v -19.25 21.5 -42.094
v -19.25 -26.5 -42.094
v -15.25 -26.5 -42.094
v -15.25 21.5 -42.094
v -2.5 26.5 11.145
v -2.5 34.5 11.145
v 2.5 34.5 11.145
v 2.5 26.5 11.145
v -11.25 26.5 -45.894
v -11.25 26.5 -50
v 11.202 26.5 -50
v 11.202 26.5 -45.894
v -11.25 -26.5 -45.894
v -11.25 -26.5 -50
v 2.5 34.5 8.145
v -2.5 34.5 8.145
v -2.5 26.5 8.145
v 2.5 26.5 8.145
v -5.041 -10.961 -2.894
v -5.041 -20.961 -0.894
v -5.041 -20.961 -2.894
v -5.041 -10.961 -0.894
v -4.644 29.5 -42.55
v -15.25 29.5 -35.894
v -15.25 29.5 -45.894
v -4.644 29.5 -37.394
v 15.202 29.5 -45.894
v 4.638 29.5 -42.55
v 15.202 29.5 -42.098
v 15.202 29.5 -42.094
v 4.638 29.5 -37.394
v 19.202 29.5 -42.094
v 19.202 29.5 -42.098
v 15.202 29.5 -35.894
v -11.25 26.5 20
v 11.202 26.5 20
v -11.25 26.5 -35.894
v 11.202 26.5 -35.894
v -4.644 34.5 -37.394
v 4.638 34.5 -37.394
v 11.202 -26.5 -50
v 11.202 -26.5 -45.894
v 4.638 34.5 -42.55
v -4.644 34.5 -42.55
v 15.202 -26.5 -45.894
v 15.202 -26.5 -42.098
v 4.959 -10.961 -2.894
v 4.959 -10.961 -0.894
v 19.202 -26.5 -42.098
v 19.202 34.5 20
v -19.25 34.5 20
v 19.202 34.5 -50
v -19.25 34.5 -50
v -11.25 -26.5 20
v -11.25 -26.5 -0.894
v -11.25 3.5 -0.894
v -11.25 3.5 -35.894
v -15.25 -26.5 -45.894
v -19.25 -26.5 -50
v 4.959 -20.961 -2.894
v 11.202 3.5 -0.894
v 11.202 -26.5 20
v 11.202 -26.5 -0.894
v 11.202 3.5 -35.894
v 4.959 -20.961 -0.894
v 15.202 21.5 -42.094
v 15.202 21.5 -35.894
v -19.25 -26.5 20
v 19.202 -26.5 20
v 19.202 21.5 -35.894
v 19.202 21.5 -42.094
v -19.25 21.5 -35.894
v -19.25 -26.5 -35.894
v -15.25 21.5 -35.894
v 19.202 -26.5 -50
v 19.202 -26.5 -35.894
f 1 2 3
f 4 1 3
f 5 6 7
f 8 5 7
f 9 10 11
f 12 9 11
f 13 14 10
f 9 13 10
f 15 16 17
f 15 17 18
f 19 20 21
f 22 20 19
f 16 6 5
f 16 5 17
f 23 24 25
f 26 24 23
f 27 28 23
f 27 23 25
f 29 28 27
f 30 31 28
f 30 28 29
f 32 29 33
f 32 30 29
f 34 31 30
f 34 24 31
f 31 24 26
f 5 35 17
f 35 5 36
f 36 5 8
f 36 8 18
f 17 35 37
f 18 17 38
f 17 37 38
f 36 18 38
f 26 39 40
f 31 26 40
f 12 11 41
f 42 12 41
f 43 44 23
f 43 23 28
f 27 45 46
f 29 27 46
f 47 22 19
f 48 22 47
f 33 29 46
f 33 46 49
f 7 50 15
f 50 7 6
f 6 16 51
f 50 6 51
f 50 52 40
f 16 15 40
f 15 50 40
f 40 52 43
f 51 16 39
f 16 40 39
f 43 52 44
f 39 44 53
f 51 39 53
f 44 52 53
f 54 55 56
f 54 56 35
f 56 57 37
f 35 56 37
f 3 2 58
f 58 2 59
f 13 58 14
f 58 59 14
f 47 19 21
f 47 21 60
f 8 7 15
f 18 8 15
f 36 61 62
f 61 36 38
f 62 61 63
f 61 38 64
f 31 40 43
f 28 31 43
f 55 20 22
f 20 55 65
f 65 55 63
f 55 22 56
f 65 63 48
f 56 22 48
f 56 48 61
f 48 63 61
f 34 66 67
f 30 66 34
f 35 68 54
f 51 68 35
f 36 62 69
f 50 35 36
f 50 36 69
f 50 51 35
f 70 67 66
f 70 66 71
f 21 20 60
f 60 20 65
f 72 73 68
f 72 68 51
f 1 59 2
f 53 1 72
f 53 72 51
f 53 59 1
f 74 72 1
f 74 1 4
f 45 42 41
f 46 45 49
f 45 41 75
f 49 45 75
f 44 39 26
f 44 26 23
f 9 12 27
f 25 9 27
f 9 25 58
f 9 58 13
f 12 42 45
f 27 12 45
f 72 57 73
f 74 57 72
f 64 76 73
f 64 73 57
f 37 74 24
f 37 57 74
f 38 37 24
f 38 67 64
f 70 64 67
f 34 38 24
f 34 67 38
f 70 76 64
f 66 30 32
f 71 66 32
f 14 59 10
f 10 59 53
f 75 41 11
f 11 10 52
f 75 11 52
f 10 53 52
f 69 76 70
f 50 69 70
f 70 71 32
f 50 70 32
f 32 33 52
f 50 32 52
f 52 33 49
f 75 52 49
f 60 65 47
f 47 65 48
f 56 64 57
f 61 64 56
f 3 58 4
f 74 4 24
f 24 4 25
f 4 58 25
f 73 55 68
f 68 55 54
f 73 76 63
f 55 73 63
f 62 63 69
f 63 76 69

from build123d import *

# Parameters (mm, degrees)
BOSS_EXTRUDE1_DEPTH      = 20
BOSS_EXTRUDE1_DEPTH_BACK = 50
SKETCH4_W                = 5
SKETCH4_H                = 3
CUT_EXTRUDE1_DEPTH       = 25
CUT_EXTRUDE5_DEPTH       = 56
SKETCH10_W               = 35
SKETCH10_H               = 30
BOSS_EXTRUDE2_DEPTH      = 25
SKETCH13_W               = 9.28125
SKETCH13_H               = 5.15625
CUT_EXTRUDE6_DEPTH       = 25
SKETCH16_W               = 4
SKETCH16_H               = 8
BOSS_EXTRUDE4_DEPTH      = 6.2
SKETCH11_W               = 10
SKETCH11_H               = 10
CUT_EXTRUDE7_DEPTH       = 2


with BuildPart() as part:
    # Sketch1 → Boss-Extrude1 (new, two sides: drawn at the far end of the back side and taken through both)
    with BuildSketch(Plane.XY.offset(-BOSS_EXTRUDE1_DEPTH_BACK)):
        Polygon((-19.25, -26.5), (-11.25, -26.5), (-11.25, 26.5), (11.202, 26.5), (11.202, -26.5), (19.202, -26.5), (19.202, 34.5), (-19.25, 34.5), align=None)
    extrude(amount=BOSS_EXTRUDE1_DEPTH + BOSS_EXTRUDE1_DEPTH_BACK)

    # Sketch4 → Cut-Extrude1 (cut, symmetric)
    with BuildSketch(Plane(origin=(0, 31.309460855, 0), x_dir=(1, 0, 0), z_dir=(0, 1, 0))):
        with Locations((0, -9.645390894)):
            Rectangle(SKETCH4_W, SKETCH4_H)
    extrude(amount=CUT_EXTRUDE1_DEPTH, both=True, mode=Mode.SUBTRACT)

    # Sketch9 → Cut-Extrude5 (cut)
    with BuildSketch(Plane.XZ.offset(26.5)):
        Polygon((-15.25, -45.893834316), (15.202, -45.893834316), (15.202, -42.098185739), (21.427419281, -42.098185739), (21.427419281, -35.893834316), (15.202, -35.893834316), (-15.25, -35.893834316), (-21.646518422, -35.893834316), (-21.646518422, -42.093834316), (-15.25, -42.093834316), align=None)
    extrude(amount=-CUT_EXTRUDE5_DEPTH, mode=Mode.SUBTRACT)

    # Sketch10 → Boss-Extrude2 (add)
    with BuildSketch(Plane.ZY.offset(-11.202)):
        with Locations((-18.393834316, -11.5)):
            Rectangle(SKETCH10_W, SKETCH10_H)
    extrude(amount=BOSS_EXTRUDE2_DEPTH)

    # Sketch13 → Cut-Extrude6 (cut)
    with BuildSketch(Plane(origin=(0, 34.5, 0), x_dir=(1, 0, 0), z_dir=(0, 1, 0))):
        with Locations((-0.003125, 39.971959316)):
            Rectangle(SKETCH13_W, SKETCH13_H)
    extrude(amount=-CUT_EXTRUDE6_DEPTH, mode=Mode.SUBTRACT)

    # Sketch16 → Boss-Extrude4 (add)
    with BuildSketch(Plane.XY.offset(-42.093834316)):
        with Locations((-17.25, 25.5)):
            Rectangle(SKETCH16_W, SKETCH16_H)
        with Locations((17.202, 25.5)):
            Rectangle(SKETCH16_W, SKETCH16_H)
    extrude(amount=BOSS_EXTRUDE4_DEPTH)

    # Sketch11 → Cut-Extrude7 (cut)
    with BuildSketch(Plane.XY.offset(-0.893834316)):
        with Locations((-0.041292147, -15.960614003)):
            Rectangle(SKETCH11_W, SKETCH11_H)
    extrude(amount=-CUT_EXTRUDE7_DEPTH, mode=Mode.SUBTRACT)


solid = part.part
